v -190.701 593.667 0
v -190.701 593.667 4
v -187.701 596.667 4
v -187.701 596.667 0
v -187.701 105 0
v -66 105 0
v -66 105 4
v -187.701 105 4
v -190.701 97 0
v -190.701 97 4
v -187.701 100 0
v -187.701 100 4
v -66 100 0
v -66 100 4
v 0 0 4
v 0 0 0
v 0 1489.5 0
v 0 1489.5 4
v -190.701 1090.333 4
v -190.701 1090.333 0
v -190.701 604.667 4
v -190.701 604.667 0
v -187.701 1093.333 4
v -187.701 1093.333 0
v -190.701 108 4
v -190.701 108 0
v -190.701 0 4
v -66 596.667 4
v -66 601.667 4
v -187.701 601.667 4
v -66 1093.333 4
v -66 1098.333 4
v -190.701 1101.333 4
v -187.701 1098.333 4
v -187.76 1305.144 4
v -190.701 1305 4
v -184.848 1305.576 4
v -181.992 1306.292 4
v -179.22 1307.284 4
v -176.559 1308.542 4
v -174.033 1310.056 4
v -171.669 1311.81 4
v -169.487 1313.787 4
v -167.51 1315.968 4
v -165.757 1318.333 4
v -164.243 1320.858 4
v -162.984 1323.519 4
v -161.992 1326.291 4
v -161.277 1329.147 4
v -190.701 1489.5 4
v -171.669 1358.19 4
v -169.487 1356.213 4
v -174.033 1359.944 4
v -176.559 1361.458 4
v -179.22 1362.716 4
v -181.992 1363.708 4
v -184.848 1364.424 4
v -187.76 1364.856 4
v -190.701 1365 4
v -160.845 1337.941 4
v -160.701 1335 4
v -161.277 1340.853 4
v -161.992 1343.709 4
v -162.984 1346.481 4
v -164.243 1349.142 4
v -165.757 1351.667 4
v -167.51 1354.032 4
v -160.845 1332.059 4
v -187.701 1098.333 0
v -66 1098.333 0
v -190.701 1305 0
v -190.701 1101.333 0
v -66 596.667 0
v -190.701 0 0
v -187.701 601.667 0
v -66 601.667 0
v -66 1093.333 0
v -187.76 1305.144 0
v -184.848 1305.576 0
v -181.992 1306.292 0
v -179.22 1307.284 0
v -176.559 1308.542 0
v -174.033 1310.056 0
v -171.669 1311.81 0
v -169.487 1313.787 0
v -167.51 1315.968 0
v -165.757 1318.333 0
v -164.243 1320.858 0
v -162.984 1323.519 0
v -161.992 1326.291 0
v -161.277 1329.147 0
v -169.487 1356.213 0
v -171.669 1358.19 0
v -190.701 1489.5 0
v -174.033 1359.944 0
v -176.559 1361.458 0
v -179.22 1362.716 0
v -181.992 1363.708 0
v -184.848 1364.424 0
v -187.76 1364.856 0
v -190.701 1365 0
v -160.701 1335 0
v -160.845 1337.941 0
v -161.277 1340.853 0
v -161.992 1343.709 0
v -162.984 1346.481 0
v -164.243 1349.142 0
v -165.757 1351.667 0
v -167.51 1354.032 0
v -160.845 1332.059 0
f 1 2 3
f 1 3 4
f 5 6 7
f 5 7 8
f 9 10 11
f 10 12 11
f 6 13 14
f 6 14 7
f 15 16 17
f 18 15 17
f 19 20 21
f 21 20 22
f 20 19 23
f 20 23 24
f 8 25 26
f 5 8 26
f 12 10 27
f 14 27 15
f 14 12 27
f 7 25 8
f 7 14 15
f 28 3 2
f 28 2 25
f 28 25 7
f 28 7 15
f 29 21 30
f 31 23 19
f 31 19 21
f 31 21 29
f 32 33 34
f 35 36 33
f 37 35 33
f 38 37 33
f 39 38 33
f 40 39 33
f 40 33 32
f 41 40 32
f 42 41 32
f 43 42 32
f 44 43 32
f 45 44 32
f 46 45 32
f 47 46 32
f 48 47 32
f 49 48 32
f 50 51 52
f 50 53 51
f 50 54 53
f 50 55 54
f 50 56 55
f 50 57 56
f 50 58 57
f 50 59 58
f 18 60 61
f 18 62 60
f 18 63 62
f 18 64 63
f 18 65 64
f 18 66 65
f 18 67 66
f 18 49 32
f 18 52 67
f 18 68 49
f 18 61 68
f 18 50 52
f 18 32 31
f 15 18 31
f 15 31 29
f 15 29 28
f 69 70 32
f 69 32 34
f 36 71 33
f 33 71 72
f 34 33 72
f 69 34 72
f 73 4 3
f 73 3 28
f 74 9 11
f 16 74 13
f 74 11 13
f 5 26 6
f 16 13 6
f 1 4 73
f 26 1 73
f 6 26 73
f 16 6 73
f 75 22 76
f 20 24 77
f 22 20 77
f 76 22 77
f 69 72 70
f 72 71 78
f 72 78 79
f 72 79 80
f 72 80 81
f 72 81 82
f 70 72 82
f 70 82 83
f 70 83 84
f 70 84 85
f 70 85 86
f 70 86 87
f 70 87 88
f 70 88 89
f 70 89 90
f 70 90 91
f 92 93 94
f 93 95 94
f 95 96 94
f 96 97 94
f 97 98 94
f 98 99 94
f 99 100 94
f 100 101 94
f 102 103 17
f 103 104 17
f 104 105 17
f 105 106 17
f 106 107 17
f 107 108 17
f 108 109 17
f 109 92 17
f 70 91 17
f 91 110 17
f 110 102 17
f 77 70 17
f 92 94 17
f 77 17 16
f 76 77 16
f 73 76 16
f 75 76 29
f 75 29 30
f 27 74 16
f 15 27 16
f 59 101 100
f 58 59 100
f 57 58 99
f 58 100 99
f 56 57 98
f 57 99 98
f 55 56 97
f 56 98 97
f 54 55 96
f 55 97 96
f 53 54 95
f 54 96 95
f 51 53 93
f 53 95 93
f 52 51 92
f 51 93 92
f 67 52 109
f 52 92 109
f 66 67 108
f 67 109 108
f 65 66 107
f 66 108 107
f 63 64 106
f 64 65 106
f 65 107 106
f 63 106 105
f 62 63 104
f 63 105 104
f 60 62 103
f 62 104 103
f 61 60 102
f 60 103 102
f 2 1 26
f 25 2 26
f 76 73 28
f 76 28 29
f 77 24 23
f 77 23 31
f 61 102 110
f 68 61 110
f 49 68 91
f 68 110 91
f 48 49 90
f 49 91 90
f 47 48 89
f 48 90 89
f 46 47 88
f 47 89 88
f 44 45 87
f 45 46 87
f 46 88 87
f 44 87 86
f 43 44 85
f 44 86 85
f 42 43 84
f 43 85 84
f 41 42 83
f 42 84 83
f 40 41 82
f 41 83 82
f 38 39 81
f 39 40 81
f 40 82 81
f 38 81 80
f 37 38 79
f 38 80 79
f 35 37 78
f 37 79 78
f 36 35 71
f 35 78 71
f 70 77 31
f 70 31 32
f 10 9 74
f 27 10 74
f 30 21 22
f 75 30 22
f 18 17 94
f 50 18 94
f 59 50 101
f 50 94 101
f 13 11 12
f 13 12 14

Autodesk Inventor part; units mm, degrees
ref_plane "YZ Plane" through (0, 0, 0) normal (1, 0, 0) x (0, 1, 0)
ref_plane "XZ Plane" through (0, 0, 0) normal (0, 1, 0) x (-1, 0, 0)
ref_plane "XY Plane" through (0, 0, 0) normal (0, 0, 1) x (1, 0, 0)
sketch "Sketch1" plane through (0, 0, 0) normal (0, 0, 1) x (1, 0, 0)
  line L0 (0, 1489.5) -> (-190.7006, 1489.5)
  line L1 (-190.7006, 1489.5) -> (-190.7006, 0)
  line L2 (-190.7006, 0) -> (0, 0)
  line L3 (0, 0) -> (0, 1489.5)
  line L4 (-190.7006, 100) -> (-66, 100)
  line L5 (-66, 100) -> (-66, 105)
  line L6 (-66, 105) -> (-190.7006, 105)
  line L7 (-190.7006, 105) -> (-190.7006, 100)
  line L8 (-190.7006, 596.6667) -> (-66, 596.6667)
  line L9 (-66, 596.6667) -> (-66, 601.6667)
  line L10 (-66, 601.6667) -> (-190.7006, 601.6667)
  line L11 (-190.7006, 601.6667) -> (-190.7006, 596.6667)
  line L12 (-190.7006, 1093.3333) -> (-66, 1093.3333)
  line L13 (-66, 1093.3333) -> (-66, 1098.3333)
  line L14 (-66, 1098.3333) -> (-190.7006, 1098.3333)
  line L15 (-190.7006, 1098.3333) -> (-190.7006, 1093.3333)
  circle A0 centre (-190.7006, 1335) radius 30
  point P0 (-190.7006, 1098.3333)
  point P1 (-190.7006, 1093.3333)
  point P2 (-190.7006, 601.6667)
  point P3 (-190.7006, 596.6667)
  point P4 (-190.7006, 1365)
  point P5 (-190.7006, 1305)
  dimension "d0" = 1489.5
  dimension "d1" = 190.7006
  dimension "d2" = 5
  dimension "d4" = 100
  dimension "d7" = 496.6667
  dimension "d23" = 66
  dimension "d29" = 60
  dimension "d30" = 1335
extrude "Plate1" add sketch "Sketch1" along normal blind 4 contours L3 L2 L1 L4 L5 L6 L8 L9 L10 L12 L13 L14 A0 L0
chamfer "Corner Chamfer1" distance 3 angle 45 6 edges at (-190.7006, 100, 2) (-190.7006, 105, 2) (-190.7006, 596.6667, 2) (-190.7006, 601.6667, 2) (-190.7006, 1098.3333, 2) (-190.7006, 1093.3333, 2)
equation "\"d0\" = Стрингер_длина"
equation "\"d1\" = стрингер_глубина_1"
equation "\"d2\" = паз_под_стрингер_толщина"
equation "\"d7\" = Шаг_шпангоутов"
equation "\"d23\" = паз_под_стрингер_глубина - Thickness"
equation "\"d29\" = 2 * радиус_выреза_под_сварку"
equation "\"d12\" = Thickness"
equation "\"BendRadius\" = Thickness"
equation "\"BendReliefWidth\" = Thickness"
equation "\"BendReliefDepth\" = 0.5 * Thickness"
equation "\"CornerReliefSize\" = 4 * Thickness"
equation "\"MinimumRemnant\" = 2 * Thickness"
equation "\"TransitionRadius\" = BendRadius"
equation "\"JacobiRadiusSize\" = BendRadius"
equation "\"GapSize\" = Thickness"
equation "\"Стрингер_длина\" = 1489.5"
equation "\"стрингер_глубина_1\" = 190.700557"
equation "\"паз_под_стрингер_толщина\" = 5"
equation "\"Шаг_шпангоутов\" = 496.666667"
equation "\"паз_под_стрингер_глубина\" = 70"
equation "\"Thickness\" = 4"
equation "\"радиус_выреза_под_сварку\" = 30"
properties part number "GBK 3113 stringer 1" material "Steel"
